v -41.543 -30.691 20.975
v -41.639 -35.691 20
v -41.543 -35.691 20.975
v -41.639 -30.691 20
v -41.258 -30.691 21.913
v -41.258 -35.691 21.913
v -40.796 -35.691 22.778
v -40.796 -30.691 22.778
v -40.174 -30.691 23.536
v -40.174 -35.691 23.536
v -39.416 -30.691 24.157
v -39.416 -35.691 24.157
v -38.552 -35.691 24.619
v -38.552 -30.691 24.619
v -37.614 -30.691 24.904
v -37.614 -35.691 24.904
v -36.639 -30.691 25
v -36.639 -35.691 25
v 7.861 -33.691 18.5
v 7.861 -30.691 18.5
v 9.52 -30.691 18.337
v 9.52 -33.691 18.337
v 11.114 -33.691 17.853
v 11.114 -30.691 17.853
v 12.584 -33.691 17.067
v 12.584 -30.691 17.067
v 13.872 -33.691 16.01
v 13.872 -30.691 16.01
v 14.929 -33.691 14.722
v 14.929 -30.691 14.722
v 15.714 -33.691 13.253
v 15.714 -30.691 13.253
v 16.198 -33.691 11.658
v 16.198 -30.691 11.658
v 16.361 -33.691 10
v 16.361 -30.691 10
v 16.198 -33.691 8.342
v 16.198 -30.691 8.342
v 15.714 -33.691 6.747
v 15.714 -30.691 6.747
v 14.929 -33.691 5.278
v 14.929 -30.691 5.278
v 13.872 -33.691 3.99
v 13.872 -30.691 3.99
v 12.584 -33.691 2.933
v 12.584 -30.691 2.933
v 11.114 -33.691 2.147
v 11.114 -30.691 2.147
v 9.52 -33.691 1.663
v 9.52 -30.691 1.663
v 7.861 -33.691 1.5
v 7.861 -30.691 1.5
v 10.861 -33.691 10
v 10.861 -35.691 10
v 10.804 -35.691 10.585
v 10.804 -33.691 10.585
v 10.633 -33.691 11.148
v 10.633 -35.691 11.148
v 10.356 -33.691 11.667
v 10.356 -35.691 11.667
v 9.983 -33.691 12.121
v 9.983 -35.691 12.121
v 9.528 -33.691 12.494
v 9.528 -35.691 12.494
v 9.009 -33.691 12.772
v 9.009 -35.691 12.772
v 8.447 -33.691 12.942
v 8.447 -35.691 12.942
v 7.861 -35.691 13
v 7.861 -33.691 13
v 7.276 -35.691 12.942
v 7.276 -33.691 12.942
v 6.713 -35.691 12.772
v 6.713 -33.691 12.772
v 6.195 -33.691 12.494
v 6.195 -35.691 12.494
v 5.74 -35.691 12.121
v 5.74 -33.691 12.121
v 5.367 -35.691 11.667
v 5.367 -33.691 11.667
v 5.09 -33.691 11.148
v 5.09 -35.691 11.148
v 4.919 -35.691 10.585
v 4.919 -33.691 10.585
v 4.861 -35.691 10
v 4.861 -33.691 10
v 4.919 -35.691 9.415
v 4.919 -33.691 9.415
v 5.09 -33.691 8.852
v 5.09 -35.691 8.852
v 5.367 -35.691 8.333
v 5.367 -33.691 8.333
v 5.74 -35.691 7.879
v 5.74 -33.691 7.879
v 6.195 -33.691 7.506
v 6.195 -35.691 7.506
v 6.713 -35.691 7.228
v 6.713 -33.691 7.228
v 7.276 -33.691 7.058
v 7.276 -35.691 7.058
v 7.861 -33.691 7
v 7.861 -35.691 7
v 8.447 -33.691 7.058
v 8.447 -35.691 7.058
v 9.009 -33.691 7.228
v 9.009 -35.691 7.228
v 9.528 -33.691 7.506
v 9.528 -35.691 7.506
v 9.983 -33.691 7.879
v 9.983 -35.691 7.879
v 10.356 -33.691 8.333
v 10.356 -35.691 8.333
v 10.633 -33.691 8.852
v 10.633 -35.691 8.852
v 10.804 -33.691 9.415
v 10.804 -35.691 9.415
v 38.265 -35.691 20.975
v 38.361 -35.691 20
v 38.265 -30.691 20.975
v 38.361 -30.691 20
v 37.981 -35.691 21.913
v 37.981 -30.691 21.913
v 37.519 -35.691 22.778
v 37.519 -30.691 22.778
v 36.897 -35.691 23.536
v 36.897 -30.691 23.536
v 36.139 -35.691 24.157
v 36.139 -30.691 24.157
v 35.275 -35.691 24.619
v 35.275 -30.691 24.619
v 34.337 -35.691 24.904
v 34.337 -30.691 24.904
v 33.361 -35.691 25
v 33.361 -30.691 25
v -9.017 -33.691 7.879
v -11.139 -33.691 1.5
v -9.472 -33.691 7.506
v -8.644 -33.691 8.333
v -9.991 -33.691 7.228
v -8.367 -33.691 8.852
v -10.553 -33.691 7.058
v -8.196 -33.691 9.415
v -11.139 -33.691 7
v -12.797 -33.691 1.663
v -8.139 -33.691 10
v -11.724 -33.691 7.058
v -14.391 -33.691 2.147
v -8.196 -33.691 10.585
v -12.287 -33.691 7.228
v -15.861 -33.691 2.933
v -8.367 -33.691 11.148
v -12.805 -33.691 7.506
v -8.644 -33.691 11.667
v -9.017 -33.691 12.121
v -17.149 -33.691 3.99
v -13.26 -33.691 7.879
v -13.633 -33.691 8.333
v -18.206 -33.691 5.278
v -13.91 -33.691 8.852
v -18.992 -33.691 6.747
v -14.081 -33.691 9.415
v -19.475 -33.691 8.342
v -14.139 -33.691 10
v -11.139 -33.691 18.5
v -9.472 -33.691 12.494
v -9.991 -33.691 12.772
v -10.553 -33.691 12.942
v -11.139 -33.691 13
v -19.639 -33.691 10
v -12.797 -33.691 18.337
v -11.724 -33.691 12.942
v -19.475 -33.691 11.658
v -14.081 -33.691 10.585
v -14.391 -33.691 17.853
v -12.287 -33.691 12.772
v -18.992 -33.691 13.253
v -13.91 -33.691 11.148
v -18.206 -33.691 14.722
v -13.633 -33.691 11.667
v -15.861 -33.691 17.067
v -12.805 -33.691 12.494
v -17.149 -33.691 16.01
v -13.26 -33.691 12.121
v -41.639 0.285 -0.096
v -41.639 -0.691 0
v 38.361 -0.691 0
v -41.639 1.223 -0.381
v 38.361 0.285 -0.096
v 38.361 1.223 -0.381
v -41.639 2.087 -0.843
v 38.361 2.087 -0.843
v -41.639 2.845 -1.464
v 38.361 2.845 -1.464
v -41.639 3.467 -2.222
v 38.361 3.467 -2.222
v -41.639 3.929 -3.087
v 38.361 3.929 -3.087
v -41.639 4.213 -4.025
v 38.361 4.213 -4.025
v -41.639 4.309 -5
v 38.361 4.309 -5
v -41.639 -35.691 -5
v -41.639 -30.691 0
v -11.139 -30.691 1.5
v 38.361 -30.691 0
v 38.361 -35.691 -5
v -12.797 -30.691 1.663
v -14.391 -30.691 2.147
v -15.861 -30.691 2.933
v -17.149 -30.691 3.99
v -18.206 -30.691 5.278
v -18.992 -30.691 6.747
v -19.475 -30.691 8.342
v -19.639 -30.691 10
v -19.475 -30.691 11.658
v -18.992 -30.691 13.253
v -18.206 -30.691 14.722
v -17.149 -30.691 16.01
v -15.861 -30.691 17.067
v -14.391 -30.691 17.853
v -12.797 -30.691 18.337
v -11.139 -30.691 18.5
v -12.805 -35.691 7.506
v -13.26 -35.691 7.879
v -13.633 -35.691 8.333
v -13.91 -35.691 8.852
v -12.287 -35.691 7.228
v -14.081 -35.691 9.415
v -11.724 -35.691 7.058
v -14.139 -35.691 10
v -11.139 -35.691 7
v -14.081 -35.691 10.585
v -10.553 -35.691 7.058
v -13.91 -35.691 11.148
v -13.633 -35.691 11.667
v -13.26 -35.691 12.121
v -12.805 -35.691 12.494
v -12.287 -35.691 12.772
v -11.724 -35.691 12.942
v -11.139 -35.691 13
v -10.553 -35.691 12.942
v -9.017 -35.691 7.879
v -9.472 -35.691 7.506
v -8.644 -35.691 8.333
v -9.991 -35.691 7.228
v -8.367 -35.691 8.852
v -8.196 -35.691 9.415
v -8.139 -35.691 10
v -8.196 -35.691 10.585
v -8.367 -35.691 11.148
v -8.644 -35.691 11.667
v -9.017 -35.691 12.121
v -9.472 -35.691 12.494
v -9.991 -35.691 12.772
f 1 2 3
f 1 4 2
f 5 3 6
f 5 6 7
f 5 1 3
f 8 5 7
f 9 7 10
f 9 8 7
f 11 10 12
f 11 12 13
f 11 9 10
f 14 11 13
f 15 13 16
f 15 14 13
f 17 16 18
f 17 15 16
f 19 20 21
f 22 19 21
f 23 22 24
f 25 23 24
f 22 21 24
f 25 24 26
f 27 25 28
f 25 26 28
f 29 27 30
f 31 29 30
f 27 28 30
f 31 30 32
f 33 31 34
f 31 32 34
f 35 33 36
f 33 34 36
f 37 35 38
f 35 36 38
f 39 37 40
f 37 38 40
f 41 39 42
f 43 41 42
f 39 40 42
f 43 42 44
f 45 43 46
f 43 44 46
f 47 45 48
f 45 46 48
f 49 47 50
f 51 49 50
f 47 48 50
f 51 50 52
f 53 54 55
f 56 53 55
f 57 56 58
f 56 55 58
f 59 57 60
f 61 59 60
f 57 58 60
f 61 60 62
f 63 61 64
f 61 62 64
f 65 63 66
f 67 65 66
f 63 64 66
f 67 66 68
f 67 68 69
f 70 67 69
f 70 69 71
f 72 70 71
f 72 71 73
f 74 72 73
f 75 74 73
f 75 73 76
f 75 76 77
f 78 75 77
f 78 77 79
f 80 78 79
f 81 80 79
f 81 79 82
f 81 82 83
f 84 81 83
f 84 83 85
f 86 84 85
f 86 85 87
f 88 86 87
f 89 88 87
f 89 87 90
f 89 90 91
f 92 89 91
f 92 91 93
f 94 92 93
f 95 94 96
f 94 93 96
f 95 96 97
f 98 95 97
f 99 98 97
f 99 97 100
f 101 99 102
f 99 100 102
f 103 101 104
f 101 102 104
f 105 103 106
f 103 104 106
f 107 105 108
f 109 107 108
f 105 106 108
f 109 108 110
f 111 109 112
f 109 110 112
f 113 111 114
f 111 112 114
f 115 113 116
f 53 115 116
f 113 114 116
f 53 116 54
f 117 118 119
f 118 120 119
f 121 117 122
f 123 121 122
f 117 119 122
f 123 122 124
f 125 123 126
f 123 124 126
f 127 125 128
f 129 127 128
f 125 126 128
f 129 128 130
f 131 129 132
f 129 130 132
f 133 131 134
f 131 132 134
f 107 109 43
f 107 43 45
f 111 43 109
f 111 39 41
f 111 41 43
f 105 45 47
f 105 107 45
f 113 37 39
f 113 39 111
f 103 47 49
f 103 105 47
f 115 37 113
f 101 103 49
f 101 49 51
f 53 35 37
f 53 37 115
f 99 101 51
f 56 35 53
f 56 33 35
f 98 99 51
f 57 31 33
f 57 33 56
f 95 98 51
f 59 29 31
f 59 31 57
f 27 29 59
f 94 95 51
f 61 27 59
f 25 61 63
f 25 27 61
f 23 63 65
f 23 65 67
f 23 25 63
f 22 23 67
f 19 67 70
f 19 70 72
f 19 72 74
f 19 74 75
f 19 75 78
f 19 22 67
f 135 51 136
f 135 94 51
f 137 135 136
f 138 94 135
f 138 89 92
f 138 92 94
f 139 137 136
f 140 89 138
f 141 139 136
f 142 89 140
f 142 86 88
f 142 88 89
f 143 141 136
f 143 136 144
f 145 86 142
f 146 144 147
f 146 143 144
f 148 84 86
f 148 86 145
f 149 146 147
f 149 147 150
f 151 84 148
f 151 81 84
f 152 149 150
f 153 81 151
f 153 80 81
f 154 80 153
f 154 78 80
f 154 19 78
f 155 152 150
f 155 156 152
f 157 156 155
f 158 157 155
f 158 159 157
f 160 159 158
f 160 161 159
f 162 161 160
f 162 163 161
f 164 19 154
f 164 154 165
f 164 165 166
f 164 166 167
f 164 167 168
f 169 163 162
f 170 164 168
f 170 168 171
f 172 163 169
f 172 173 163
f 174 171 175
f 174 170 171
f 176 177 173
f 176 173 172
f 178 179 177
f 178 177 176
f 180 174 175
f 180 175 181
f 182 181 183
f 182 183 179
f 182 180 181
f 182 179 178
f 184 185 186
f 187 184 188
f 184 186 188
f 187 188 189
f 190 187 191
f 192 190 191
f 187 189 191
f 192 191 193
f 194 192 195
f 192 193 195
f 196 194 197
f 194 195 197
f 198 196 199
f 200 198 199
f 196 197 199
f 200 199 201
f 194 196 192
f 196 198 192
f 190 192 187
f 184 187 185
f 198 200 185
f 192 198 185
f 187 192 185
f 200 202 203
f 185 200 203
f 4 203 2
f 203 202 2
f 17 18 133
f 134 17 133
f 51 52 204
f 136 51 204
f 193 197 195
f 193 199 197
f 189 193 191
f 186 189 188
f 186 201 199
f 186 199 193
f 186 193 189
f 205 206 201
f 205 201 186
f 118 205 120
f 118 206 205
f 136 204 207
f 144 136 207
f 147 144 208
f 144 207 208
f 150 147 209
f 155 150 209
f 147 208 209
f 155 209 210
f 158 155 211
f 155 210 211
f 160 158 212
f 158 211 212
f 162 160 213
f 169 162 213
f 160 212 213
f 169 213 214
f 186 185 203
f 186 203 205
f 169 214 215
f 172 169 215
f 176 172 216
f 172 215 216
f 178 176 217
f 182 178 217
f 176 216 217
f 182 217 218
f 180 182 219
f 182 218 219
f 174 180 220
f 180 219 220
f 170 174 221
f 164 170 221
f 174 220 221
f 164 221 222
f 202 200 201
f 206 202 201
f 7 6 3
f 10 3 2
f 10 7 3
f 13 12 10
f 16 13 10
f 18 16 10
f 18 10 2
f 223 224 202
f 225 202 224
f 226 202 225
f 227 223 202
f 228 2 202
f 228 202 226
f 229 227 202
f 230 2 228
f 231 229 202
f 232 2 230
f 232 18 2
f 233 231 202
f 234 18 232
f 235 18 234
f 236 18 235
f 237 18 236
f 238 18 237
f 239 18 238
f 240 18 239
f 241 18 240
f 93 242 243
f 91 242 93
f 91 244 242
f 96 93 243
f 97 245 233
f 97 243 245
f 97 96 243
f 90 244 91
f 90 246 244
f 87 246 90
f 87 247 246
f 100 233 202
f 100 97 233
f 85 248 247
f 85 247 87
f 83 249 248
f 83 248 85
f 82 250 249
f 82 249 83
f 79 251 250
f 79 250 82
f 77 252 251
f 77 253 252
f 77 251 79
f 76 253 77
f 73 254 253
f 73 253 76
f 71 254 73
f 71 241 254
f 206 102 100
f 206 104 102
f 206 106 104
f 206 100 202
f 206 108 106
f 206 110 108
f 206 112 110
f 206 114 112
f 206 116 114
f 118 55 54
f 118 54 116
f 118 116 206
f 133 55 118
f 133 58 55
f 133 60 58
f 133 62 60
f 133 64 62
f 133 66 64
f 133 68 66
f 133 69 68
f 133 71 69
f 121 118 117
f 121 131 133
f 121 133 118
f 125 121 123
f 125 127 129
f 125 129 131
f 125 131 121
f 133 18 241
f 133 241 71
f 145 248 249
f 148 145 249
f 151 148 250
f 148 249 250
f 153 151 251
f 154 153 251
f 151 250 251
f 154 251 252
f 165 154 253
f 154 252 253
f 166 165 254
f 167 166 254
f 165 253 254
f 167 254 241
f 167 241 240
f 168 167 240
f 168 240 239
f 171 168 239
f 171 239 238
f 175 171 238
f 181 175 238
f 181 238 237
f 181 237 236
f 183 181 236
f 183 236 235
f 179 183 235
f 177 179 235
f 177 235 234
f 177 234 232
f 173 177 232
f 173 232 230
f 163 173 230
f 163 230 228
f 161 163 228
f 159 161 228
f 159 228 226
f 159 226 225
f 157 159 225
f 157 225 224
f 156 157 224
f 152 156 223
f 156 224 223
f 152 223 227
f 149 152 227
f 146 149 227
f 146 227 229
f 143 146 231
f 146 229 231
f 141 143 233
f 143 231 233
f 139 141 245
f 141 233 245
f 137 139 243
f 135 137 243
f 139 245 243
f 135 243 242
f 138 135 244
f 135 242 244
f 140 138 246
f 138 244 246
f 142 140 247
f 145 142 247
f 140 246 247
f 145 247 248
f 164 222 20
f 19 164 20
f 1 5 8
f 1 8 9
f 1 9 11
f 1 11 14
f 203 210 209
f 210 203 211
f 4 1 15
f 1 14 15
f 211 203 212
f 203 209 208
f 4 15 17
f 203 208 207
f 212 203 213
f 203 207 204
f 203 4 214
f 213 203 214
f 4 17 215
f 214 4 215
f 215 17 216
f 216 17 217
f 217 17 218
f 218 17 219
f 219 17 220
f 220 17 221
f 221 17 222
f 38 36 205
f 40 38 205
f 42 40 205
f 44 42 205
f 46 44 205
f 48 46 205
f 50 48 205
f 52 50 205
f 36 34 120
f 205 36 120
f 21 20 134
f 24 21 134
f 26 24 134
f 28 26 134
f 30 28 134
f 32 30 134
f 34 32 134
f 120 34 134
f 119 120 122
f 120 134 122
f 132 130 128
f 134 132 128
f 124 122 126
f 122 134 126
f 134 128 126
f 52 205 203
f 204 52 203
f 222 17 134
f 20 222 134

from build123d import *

# Parameters (mm, degrees)
F0_W     = 80
F0_H     = 40
F1_DEPTH = 5
F2_W     = 80
F2_H     = 25
F2_R     = 3
F3_DEPTH = 5
F4_R     = 4.99999
F5_R     = 3
F6_DEPTH = 3


# Not quite as in the source:
# - a fillet or chamfer is up to 0.001 mm smaller than in the source, because OpenCascade refuses the exact size


with BuildPart() as f1:
    # F0 (on Top) → F1 (new body)
    with BuildSketch(Plane.XY):
        with Locations((-1.6386443377, -15.6908366084)):
            Rectangle(F0_W, F0_H)
    extrude(amount=-F1_DEPTH)

    # F2 (on face) → F3 (join)
    with BuildSketch(Plane.XZ.offset(35.6908366084)):
        with Locations((-1.6386443377, 12.5)):
            Rectangle(F2_W, F2_H)
        with Locations((-11.1386443377, 10)):
            Circle(F2_R, mode=Mode.SUBTRACT)
        with Locations((7.8613556623, 10)):
            Circle(F2_R, mode=Mode.SUBTRACT)
    extrude(amount=-F3_DEPTH)

    # F4 (radius 5 in the source; OpenCascade refuses exactly that, so slightly less here)
    f4_edges = [f1.edges().sort_by_distance(p)[0] for p in [
        (-41.638644, -33.190837, 25),
        (38.361356, -33.190837, 25),
        (-1.638644, 4.309163, 0),
    ]]
    fillet(f4_edges, radius=F4_R)

    # F5 (on face) → F6 (cut)
    with BuildSketch(Plane(origin=(0, -30.6908366084, 0), x_dir=(-1, 0, 0), z_dir=(0, 1, 0))):
        with BuildLine():
            ThreePointArc((-7.8613556623, 1.5), (-1.8509480223, 3.9895923599), (0.6386443377, 10))
            ThreePointArc((0.6386443377, 10), (-1.8509480223, 16.0104076401), (-7.8613556623, 18.5))
            ThreePointArc((-7.8613556623, 18.5), (-16.3613556623, 10), (-7.8613556623, 1.5))
        make_face()
        with Locations((-7.8613556623, 10)):
            Circle(F5_R, mode=Mode.SUBTRACT)
        with BuildLine():
            ThreePointArc((-7.8613556623, 18.5), (-1.8509480223, 16.0104076401), (0.6386443377, 10))
            ThreePointArc((0.6386443377, 10), (-1.8509480223, 3.9895923599), (-7.8613556623, 1.5))
            Line((-7.8613556623, 1.5), (11.1386443377, 1.5))
            ThreePointArc((11.1386443377, 1.5), (2.6386443377, 10), (11.1386443377, 18.5))
            Line((11.1386443377, 18.5), (-7.8613556623, 18.5))
        make_face()
        with BuildLine():
            ThreePointArc((19.6386443377, 10), (17.1490519777, 16.0104076401), (11.1386443377, 18.5))
            ThreePointArc((11.1386443377, 18.5), (2.6386443377, 10), (11.1386443377, 1.5))
            ThreePointArc((11.1386443377, 1.5), (17.1490519777, 3.9895923599), (19.6386443377, 10))
        make_face()
        with Locations((11.1386443377, 10)):
            Circle(F5_R, mode=Mode.SUBTRACT)
        with Locations((11.1386443377, 10)):
            Circle(F5_R)
        with Locations((-7.8613556623, 10)):
            Circle(F5_R)
    extrude(amount=-F6_DEPTH, mode=Mode.SUBTRACT)


solid = f1.part
